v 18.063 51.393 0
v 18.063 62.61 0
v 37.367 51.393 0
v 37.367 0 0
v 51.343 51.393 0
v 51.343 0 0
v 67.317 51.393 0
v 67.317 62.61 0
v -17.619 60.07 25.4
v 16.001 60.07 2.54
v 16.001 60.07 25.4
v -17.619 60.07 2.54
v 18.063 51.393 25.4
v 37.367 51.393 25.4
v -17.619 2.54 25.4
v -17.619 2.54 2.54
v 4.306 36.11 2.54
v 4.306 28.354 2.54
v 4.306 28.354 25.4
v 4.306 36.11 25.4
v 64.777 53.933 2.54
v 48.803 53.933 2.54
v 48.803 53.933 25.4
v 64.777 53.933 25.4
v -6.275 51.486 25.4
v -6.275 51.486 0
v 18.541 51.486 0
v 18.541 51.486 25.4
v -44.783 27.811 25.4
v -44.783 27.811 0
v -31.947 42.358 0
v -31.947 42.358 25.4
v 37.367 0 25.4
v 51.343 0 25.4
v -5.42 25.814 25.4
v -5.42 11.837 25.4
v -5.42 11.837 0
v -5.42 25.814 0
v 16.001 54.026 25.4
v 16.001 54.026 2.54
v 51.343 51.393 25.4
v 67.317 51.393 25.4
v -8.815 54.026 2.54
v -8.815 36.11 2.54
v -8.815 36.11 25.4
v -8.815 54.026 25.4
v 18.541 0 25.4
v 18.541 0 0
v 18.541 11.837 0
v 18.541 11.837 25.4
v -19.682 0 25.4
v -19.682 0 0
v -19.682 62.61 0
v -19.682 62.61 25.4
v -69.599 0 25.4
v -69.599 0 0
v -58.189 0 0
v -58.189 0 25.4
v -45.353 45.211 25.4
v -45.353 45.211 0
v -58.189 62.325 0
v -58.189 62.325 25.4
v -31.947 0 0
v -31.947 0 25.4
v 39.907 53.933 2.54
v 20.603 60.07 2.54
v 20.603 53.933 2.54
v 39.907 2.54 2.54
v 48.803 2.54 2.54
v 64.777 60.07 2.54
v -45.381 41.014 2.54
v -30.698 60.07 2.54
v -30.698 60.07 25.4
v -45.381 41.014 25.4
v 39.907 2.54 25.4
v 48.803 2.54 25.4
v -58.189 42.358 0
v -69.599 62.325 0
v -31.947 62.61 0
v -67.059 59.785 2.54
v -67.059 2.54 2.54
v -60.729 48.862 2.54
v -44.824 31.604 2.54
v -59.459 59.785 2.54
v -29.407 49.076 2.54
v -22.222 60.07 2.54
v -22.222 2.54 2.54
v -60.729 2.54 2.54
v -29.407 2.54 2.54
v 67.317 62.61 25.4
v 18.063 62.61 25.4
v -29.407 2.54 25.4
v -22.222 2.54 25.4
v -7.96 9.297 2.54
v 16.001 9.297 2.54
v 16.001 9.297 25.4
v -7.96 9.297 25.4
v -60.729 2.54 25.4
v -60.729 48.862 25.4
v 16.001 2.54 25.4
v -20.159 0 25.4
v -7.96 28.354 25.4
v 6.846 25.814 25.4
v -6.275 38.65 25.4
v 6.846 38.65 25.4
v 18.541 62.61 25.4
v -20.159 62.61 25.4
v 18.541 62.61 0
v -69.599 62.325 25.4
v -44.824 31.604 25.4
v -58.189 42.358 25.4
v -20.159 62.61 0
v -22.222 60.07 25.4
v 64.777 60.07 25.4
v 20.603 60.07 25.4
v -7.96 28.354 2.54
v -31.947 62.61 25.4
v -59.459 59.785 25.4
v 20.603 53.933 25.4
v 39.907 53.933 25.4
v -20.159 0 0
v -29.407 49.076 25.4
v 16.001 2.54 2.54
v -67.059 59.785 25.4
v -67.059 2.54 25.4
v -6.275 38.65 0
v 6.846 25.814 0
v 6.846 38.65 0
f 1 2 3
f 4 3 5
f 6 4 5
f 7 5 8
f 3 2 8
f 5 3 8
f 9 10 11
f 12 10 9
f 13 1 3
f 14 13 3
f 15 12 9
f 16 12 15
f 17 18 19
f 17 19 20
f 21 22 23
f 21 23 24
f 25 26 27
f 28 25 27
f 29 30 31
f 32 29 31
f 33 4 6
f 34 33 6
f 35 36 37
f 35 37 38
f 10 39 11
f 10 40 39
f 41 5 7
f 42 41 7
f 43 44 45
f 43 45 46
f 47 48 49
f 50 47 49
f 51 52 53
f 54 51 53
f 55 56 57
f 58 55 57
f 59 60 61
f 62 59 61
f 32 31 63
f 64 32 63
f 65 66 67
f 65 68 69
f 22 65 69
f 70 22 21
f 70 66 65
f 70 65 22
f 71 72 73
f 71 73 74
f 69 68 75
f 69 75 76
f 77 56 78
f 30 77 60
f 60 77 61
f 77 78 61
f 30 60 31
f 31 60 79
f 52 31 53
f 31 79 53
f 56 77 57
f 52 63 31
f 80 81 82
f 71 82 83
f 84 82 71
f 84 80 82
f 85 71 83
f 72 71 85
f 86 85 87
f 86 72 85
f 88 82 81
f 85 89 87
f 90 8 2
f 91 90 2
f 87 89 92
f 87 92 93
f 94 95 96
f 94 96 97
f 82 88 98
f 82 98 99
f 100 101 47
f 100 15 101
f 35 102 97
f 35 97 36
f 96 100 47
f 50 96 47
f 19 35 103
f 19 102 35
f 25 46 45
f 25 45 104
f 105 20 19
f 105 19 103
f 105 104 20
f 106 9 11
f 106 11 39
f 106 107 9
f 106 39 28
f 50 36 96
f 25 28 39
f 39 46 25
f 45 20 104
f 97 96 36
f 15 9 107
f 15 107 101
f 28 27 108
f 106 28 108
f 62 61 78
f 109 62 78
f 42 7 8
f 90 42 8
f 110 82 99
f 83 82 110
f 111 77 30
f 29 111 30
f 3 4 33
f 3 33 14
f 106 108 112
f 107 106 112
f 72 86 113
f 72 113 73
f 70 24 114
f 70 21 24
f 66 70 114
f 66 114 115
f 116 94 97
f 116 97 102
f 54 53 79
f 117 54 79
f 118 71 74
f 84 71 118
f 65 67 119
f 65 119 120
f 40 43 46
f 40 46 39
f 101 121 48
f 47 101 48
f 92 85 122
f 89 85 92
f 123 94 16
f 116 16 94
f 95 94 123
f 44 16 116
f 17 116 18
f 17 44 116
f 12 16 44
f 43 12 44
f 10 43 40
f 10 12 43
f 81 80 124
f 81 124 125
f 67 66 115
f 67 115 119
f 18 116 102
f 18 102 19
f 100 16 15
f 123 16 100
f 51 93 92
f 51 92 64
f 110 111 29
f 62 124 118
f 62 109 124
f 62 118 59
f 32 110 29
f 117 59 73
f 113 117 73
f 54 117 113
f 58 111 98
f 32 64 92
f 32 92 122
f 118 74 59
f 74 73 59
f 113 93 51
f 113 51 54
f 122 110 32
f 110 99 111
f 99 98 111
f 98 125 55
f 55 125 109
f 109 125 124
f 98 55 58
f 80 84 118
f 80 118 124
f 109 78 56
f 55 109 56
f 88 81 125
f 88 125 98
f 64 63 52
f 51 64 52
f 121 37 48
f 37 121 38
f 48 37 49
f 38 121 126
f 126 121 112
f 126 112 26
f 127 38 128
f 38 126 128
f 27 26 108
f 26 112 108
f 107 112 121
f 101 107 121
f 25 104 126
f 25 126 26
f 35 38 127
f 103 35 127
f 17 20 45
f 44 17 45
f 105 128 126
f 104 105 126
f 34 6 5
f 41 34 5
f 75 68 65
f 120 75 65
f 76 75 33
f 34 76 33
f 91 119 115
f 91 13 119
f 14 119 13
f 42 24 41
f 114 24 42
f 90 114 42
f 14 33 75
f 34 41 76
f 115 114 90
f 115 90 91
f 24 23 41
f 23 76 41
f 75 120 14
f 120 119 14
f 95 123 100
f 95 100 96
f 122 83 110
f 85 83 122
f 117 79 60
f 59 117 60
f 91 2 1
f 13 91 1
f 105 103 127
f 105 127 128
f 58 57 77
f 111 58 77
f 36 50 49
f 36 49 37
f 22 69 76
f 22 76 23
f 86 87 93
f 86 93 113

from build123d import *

# Parameters (mm, degrees)
F3_DEPTH = 25.4
F2_W     = 13.9767900109
F2_H     = 51.3929091394
F4_T     = -2.54
F4_2_T   = -2.54
F4_3_T   = -2.54


with BuildPart() as f3:
    # F0 (on Top) → F3 (new body)
    with BuildSketch(Plane.XY):
        Polygon((-45.3532636166, 45.2106446028), (-58.1890903413, 62.325078994), (-58.1890903413, 42.35823825), (-44.7827801108, 27.8109628707), (-31.9469533861, 42.35823825), (-31.9469533861, 62.6103207469), align=None)
        Polygon((-19.6816045791, 62.6103207469), (-31.9469533861, 62.6103207469), (-31.9469533861, 42.35823825), (-31.9469533861, 0), (-19.6816045791, 0), align=None)
        Polygon((-58.1890903413, 62.325078994), (-69.5987194777, 62.325078994), (-69.5987194777, 0), (-58.1890903413, 0), (-58.1890903413, 42.35823825), align=None)
    extrude(amount=F3_DEPTH)

    # F4
    f4_openings = [f3.faces().sort_by_distance(p)[0] for p in [
        (-44.330156, 34.586922, 25.4),
    ]]
    offset(amount=F4_T, openings=f4_openings, kind=Kind.INTERSECTION)


with BuildPart() as f3b:
    # F1 (on Top) → F3, piece 2 (new body)
    with BuildSketch(Plane.XY):
        Polygon((18.5406412929, 62.6103207469), (-20.1590619981, 62.6103207469), (-20.1590619981, 0), (18.5406412929, 0), (18.5406412929, 11.8374861777), (-5.4195728153, 11.8374861777), (-5.4195728153, 25.8142780513), (6.8457750604, 25.8142780513), (6.8457750604, 38.6501066387), (-6.2752948143, 38.6501066387), (-6.2752948143, 41.7877547443), (-6.2752948143, 51.4859370887), (18.5406412929, 51.4859370887), align=None)
    extrude(amount=F3_DEPTH)

    # F4#2
    f4_2_openings = [f3b.faces().sort_by_distance(p)[0] for p in [
        (-4.950166, 31.092782, 25.4),
    ]]
    offset(amount=F4_2_T, openings=f4_2_openings, kind=Kind.INTERSECTION)


with BuildPart() as f3c:
    # F2 (on Top) → F3, piece 3 (new body)
    with BuildSketch(Plane.XY):
        Polygon((67.3167929053, 62.6103207469), (18.0631857365, 62.6103207469), (18.0631857365, 51.3929091394), (37.3665243387, 51.3929091394), (51.3433143497, 51.3929091394), (67.3167929053, 51.3929091394), align=None)
        with Locations((44.3549193442, 25.6964545697)):
            Rectangle(F2_W, F2_H)
    extrude(amount=F3_DEPTH)

    # F4#3
    f4_3_openings = [f3c.faces().sort_by_distance(p)[0] for p in [
        (43.631071, 39.306746, 25.4),
    ]]
    offset(amount=F4_3_T, openings=f4_3_openings, kind=Kind.INTERSECTION)


solid = Compound([f3.part, f3b.part, f3c.part])
